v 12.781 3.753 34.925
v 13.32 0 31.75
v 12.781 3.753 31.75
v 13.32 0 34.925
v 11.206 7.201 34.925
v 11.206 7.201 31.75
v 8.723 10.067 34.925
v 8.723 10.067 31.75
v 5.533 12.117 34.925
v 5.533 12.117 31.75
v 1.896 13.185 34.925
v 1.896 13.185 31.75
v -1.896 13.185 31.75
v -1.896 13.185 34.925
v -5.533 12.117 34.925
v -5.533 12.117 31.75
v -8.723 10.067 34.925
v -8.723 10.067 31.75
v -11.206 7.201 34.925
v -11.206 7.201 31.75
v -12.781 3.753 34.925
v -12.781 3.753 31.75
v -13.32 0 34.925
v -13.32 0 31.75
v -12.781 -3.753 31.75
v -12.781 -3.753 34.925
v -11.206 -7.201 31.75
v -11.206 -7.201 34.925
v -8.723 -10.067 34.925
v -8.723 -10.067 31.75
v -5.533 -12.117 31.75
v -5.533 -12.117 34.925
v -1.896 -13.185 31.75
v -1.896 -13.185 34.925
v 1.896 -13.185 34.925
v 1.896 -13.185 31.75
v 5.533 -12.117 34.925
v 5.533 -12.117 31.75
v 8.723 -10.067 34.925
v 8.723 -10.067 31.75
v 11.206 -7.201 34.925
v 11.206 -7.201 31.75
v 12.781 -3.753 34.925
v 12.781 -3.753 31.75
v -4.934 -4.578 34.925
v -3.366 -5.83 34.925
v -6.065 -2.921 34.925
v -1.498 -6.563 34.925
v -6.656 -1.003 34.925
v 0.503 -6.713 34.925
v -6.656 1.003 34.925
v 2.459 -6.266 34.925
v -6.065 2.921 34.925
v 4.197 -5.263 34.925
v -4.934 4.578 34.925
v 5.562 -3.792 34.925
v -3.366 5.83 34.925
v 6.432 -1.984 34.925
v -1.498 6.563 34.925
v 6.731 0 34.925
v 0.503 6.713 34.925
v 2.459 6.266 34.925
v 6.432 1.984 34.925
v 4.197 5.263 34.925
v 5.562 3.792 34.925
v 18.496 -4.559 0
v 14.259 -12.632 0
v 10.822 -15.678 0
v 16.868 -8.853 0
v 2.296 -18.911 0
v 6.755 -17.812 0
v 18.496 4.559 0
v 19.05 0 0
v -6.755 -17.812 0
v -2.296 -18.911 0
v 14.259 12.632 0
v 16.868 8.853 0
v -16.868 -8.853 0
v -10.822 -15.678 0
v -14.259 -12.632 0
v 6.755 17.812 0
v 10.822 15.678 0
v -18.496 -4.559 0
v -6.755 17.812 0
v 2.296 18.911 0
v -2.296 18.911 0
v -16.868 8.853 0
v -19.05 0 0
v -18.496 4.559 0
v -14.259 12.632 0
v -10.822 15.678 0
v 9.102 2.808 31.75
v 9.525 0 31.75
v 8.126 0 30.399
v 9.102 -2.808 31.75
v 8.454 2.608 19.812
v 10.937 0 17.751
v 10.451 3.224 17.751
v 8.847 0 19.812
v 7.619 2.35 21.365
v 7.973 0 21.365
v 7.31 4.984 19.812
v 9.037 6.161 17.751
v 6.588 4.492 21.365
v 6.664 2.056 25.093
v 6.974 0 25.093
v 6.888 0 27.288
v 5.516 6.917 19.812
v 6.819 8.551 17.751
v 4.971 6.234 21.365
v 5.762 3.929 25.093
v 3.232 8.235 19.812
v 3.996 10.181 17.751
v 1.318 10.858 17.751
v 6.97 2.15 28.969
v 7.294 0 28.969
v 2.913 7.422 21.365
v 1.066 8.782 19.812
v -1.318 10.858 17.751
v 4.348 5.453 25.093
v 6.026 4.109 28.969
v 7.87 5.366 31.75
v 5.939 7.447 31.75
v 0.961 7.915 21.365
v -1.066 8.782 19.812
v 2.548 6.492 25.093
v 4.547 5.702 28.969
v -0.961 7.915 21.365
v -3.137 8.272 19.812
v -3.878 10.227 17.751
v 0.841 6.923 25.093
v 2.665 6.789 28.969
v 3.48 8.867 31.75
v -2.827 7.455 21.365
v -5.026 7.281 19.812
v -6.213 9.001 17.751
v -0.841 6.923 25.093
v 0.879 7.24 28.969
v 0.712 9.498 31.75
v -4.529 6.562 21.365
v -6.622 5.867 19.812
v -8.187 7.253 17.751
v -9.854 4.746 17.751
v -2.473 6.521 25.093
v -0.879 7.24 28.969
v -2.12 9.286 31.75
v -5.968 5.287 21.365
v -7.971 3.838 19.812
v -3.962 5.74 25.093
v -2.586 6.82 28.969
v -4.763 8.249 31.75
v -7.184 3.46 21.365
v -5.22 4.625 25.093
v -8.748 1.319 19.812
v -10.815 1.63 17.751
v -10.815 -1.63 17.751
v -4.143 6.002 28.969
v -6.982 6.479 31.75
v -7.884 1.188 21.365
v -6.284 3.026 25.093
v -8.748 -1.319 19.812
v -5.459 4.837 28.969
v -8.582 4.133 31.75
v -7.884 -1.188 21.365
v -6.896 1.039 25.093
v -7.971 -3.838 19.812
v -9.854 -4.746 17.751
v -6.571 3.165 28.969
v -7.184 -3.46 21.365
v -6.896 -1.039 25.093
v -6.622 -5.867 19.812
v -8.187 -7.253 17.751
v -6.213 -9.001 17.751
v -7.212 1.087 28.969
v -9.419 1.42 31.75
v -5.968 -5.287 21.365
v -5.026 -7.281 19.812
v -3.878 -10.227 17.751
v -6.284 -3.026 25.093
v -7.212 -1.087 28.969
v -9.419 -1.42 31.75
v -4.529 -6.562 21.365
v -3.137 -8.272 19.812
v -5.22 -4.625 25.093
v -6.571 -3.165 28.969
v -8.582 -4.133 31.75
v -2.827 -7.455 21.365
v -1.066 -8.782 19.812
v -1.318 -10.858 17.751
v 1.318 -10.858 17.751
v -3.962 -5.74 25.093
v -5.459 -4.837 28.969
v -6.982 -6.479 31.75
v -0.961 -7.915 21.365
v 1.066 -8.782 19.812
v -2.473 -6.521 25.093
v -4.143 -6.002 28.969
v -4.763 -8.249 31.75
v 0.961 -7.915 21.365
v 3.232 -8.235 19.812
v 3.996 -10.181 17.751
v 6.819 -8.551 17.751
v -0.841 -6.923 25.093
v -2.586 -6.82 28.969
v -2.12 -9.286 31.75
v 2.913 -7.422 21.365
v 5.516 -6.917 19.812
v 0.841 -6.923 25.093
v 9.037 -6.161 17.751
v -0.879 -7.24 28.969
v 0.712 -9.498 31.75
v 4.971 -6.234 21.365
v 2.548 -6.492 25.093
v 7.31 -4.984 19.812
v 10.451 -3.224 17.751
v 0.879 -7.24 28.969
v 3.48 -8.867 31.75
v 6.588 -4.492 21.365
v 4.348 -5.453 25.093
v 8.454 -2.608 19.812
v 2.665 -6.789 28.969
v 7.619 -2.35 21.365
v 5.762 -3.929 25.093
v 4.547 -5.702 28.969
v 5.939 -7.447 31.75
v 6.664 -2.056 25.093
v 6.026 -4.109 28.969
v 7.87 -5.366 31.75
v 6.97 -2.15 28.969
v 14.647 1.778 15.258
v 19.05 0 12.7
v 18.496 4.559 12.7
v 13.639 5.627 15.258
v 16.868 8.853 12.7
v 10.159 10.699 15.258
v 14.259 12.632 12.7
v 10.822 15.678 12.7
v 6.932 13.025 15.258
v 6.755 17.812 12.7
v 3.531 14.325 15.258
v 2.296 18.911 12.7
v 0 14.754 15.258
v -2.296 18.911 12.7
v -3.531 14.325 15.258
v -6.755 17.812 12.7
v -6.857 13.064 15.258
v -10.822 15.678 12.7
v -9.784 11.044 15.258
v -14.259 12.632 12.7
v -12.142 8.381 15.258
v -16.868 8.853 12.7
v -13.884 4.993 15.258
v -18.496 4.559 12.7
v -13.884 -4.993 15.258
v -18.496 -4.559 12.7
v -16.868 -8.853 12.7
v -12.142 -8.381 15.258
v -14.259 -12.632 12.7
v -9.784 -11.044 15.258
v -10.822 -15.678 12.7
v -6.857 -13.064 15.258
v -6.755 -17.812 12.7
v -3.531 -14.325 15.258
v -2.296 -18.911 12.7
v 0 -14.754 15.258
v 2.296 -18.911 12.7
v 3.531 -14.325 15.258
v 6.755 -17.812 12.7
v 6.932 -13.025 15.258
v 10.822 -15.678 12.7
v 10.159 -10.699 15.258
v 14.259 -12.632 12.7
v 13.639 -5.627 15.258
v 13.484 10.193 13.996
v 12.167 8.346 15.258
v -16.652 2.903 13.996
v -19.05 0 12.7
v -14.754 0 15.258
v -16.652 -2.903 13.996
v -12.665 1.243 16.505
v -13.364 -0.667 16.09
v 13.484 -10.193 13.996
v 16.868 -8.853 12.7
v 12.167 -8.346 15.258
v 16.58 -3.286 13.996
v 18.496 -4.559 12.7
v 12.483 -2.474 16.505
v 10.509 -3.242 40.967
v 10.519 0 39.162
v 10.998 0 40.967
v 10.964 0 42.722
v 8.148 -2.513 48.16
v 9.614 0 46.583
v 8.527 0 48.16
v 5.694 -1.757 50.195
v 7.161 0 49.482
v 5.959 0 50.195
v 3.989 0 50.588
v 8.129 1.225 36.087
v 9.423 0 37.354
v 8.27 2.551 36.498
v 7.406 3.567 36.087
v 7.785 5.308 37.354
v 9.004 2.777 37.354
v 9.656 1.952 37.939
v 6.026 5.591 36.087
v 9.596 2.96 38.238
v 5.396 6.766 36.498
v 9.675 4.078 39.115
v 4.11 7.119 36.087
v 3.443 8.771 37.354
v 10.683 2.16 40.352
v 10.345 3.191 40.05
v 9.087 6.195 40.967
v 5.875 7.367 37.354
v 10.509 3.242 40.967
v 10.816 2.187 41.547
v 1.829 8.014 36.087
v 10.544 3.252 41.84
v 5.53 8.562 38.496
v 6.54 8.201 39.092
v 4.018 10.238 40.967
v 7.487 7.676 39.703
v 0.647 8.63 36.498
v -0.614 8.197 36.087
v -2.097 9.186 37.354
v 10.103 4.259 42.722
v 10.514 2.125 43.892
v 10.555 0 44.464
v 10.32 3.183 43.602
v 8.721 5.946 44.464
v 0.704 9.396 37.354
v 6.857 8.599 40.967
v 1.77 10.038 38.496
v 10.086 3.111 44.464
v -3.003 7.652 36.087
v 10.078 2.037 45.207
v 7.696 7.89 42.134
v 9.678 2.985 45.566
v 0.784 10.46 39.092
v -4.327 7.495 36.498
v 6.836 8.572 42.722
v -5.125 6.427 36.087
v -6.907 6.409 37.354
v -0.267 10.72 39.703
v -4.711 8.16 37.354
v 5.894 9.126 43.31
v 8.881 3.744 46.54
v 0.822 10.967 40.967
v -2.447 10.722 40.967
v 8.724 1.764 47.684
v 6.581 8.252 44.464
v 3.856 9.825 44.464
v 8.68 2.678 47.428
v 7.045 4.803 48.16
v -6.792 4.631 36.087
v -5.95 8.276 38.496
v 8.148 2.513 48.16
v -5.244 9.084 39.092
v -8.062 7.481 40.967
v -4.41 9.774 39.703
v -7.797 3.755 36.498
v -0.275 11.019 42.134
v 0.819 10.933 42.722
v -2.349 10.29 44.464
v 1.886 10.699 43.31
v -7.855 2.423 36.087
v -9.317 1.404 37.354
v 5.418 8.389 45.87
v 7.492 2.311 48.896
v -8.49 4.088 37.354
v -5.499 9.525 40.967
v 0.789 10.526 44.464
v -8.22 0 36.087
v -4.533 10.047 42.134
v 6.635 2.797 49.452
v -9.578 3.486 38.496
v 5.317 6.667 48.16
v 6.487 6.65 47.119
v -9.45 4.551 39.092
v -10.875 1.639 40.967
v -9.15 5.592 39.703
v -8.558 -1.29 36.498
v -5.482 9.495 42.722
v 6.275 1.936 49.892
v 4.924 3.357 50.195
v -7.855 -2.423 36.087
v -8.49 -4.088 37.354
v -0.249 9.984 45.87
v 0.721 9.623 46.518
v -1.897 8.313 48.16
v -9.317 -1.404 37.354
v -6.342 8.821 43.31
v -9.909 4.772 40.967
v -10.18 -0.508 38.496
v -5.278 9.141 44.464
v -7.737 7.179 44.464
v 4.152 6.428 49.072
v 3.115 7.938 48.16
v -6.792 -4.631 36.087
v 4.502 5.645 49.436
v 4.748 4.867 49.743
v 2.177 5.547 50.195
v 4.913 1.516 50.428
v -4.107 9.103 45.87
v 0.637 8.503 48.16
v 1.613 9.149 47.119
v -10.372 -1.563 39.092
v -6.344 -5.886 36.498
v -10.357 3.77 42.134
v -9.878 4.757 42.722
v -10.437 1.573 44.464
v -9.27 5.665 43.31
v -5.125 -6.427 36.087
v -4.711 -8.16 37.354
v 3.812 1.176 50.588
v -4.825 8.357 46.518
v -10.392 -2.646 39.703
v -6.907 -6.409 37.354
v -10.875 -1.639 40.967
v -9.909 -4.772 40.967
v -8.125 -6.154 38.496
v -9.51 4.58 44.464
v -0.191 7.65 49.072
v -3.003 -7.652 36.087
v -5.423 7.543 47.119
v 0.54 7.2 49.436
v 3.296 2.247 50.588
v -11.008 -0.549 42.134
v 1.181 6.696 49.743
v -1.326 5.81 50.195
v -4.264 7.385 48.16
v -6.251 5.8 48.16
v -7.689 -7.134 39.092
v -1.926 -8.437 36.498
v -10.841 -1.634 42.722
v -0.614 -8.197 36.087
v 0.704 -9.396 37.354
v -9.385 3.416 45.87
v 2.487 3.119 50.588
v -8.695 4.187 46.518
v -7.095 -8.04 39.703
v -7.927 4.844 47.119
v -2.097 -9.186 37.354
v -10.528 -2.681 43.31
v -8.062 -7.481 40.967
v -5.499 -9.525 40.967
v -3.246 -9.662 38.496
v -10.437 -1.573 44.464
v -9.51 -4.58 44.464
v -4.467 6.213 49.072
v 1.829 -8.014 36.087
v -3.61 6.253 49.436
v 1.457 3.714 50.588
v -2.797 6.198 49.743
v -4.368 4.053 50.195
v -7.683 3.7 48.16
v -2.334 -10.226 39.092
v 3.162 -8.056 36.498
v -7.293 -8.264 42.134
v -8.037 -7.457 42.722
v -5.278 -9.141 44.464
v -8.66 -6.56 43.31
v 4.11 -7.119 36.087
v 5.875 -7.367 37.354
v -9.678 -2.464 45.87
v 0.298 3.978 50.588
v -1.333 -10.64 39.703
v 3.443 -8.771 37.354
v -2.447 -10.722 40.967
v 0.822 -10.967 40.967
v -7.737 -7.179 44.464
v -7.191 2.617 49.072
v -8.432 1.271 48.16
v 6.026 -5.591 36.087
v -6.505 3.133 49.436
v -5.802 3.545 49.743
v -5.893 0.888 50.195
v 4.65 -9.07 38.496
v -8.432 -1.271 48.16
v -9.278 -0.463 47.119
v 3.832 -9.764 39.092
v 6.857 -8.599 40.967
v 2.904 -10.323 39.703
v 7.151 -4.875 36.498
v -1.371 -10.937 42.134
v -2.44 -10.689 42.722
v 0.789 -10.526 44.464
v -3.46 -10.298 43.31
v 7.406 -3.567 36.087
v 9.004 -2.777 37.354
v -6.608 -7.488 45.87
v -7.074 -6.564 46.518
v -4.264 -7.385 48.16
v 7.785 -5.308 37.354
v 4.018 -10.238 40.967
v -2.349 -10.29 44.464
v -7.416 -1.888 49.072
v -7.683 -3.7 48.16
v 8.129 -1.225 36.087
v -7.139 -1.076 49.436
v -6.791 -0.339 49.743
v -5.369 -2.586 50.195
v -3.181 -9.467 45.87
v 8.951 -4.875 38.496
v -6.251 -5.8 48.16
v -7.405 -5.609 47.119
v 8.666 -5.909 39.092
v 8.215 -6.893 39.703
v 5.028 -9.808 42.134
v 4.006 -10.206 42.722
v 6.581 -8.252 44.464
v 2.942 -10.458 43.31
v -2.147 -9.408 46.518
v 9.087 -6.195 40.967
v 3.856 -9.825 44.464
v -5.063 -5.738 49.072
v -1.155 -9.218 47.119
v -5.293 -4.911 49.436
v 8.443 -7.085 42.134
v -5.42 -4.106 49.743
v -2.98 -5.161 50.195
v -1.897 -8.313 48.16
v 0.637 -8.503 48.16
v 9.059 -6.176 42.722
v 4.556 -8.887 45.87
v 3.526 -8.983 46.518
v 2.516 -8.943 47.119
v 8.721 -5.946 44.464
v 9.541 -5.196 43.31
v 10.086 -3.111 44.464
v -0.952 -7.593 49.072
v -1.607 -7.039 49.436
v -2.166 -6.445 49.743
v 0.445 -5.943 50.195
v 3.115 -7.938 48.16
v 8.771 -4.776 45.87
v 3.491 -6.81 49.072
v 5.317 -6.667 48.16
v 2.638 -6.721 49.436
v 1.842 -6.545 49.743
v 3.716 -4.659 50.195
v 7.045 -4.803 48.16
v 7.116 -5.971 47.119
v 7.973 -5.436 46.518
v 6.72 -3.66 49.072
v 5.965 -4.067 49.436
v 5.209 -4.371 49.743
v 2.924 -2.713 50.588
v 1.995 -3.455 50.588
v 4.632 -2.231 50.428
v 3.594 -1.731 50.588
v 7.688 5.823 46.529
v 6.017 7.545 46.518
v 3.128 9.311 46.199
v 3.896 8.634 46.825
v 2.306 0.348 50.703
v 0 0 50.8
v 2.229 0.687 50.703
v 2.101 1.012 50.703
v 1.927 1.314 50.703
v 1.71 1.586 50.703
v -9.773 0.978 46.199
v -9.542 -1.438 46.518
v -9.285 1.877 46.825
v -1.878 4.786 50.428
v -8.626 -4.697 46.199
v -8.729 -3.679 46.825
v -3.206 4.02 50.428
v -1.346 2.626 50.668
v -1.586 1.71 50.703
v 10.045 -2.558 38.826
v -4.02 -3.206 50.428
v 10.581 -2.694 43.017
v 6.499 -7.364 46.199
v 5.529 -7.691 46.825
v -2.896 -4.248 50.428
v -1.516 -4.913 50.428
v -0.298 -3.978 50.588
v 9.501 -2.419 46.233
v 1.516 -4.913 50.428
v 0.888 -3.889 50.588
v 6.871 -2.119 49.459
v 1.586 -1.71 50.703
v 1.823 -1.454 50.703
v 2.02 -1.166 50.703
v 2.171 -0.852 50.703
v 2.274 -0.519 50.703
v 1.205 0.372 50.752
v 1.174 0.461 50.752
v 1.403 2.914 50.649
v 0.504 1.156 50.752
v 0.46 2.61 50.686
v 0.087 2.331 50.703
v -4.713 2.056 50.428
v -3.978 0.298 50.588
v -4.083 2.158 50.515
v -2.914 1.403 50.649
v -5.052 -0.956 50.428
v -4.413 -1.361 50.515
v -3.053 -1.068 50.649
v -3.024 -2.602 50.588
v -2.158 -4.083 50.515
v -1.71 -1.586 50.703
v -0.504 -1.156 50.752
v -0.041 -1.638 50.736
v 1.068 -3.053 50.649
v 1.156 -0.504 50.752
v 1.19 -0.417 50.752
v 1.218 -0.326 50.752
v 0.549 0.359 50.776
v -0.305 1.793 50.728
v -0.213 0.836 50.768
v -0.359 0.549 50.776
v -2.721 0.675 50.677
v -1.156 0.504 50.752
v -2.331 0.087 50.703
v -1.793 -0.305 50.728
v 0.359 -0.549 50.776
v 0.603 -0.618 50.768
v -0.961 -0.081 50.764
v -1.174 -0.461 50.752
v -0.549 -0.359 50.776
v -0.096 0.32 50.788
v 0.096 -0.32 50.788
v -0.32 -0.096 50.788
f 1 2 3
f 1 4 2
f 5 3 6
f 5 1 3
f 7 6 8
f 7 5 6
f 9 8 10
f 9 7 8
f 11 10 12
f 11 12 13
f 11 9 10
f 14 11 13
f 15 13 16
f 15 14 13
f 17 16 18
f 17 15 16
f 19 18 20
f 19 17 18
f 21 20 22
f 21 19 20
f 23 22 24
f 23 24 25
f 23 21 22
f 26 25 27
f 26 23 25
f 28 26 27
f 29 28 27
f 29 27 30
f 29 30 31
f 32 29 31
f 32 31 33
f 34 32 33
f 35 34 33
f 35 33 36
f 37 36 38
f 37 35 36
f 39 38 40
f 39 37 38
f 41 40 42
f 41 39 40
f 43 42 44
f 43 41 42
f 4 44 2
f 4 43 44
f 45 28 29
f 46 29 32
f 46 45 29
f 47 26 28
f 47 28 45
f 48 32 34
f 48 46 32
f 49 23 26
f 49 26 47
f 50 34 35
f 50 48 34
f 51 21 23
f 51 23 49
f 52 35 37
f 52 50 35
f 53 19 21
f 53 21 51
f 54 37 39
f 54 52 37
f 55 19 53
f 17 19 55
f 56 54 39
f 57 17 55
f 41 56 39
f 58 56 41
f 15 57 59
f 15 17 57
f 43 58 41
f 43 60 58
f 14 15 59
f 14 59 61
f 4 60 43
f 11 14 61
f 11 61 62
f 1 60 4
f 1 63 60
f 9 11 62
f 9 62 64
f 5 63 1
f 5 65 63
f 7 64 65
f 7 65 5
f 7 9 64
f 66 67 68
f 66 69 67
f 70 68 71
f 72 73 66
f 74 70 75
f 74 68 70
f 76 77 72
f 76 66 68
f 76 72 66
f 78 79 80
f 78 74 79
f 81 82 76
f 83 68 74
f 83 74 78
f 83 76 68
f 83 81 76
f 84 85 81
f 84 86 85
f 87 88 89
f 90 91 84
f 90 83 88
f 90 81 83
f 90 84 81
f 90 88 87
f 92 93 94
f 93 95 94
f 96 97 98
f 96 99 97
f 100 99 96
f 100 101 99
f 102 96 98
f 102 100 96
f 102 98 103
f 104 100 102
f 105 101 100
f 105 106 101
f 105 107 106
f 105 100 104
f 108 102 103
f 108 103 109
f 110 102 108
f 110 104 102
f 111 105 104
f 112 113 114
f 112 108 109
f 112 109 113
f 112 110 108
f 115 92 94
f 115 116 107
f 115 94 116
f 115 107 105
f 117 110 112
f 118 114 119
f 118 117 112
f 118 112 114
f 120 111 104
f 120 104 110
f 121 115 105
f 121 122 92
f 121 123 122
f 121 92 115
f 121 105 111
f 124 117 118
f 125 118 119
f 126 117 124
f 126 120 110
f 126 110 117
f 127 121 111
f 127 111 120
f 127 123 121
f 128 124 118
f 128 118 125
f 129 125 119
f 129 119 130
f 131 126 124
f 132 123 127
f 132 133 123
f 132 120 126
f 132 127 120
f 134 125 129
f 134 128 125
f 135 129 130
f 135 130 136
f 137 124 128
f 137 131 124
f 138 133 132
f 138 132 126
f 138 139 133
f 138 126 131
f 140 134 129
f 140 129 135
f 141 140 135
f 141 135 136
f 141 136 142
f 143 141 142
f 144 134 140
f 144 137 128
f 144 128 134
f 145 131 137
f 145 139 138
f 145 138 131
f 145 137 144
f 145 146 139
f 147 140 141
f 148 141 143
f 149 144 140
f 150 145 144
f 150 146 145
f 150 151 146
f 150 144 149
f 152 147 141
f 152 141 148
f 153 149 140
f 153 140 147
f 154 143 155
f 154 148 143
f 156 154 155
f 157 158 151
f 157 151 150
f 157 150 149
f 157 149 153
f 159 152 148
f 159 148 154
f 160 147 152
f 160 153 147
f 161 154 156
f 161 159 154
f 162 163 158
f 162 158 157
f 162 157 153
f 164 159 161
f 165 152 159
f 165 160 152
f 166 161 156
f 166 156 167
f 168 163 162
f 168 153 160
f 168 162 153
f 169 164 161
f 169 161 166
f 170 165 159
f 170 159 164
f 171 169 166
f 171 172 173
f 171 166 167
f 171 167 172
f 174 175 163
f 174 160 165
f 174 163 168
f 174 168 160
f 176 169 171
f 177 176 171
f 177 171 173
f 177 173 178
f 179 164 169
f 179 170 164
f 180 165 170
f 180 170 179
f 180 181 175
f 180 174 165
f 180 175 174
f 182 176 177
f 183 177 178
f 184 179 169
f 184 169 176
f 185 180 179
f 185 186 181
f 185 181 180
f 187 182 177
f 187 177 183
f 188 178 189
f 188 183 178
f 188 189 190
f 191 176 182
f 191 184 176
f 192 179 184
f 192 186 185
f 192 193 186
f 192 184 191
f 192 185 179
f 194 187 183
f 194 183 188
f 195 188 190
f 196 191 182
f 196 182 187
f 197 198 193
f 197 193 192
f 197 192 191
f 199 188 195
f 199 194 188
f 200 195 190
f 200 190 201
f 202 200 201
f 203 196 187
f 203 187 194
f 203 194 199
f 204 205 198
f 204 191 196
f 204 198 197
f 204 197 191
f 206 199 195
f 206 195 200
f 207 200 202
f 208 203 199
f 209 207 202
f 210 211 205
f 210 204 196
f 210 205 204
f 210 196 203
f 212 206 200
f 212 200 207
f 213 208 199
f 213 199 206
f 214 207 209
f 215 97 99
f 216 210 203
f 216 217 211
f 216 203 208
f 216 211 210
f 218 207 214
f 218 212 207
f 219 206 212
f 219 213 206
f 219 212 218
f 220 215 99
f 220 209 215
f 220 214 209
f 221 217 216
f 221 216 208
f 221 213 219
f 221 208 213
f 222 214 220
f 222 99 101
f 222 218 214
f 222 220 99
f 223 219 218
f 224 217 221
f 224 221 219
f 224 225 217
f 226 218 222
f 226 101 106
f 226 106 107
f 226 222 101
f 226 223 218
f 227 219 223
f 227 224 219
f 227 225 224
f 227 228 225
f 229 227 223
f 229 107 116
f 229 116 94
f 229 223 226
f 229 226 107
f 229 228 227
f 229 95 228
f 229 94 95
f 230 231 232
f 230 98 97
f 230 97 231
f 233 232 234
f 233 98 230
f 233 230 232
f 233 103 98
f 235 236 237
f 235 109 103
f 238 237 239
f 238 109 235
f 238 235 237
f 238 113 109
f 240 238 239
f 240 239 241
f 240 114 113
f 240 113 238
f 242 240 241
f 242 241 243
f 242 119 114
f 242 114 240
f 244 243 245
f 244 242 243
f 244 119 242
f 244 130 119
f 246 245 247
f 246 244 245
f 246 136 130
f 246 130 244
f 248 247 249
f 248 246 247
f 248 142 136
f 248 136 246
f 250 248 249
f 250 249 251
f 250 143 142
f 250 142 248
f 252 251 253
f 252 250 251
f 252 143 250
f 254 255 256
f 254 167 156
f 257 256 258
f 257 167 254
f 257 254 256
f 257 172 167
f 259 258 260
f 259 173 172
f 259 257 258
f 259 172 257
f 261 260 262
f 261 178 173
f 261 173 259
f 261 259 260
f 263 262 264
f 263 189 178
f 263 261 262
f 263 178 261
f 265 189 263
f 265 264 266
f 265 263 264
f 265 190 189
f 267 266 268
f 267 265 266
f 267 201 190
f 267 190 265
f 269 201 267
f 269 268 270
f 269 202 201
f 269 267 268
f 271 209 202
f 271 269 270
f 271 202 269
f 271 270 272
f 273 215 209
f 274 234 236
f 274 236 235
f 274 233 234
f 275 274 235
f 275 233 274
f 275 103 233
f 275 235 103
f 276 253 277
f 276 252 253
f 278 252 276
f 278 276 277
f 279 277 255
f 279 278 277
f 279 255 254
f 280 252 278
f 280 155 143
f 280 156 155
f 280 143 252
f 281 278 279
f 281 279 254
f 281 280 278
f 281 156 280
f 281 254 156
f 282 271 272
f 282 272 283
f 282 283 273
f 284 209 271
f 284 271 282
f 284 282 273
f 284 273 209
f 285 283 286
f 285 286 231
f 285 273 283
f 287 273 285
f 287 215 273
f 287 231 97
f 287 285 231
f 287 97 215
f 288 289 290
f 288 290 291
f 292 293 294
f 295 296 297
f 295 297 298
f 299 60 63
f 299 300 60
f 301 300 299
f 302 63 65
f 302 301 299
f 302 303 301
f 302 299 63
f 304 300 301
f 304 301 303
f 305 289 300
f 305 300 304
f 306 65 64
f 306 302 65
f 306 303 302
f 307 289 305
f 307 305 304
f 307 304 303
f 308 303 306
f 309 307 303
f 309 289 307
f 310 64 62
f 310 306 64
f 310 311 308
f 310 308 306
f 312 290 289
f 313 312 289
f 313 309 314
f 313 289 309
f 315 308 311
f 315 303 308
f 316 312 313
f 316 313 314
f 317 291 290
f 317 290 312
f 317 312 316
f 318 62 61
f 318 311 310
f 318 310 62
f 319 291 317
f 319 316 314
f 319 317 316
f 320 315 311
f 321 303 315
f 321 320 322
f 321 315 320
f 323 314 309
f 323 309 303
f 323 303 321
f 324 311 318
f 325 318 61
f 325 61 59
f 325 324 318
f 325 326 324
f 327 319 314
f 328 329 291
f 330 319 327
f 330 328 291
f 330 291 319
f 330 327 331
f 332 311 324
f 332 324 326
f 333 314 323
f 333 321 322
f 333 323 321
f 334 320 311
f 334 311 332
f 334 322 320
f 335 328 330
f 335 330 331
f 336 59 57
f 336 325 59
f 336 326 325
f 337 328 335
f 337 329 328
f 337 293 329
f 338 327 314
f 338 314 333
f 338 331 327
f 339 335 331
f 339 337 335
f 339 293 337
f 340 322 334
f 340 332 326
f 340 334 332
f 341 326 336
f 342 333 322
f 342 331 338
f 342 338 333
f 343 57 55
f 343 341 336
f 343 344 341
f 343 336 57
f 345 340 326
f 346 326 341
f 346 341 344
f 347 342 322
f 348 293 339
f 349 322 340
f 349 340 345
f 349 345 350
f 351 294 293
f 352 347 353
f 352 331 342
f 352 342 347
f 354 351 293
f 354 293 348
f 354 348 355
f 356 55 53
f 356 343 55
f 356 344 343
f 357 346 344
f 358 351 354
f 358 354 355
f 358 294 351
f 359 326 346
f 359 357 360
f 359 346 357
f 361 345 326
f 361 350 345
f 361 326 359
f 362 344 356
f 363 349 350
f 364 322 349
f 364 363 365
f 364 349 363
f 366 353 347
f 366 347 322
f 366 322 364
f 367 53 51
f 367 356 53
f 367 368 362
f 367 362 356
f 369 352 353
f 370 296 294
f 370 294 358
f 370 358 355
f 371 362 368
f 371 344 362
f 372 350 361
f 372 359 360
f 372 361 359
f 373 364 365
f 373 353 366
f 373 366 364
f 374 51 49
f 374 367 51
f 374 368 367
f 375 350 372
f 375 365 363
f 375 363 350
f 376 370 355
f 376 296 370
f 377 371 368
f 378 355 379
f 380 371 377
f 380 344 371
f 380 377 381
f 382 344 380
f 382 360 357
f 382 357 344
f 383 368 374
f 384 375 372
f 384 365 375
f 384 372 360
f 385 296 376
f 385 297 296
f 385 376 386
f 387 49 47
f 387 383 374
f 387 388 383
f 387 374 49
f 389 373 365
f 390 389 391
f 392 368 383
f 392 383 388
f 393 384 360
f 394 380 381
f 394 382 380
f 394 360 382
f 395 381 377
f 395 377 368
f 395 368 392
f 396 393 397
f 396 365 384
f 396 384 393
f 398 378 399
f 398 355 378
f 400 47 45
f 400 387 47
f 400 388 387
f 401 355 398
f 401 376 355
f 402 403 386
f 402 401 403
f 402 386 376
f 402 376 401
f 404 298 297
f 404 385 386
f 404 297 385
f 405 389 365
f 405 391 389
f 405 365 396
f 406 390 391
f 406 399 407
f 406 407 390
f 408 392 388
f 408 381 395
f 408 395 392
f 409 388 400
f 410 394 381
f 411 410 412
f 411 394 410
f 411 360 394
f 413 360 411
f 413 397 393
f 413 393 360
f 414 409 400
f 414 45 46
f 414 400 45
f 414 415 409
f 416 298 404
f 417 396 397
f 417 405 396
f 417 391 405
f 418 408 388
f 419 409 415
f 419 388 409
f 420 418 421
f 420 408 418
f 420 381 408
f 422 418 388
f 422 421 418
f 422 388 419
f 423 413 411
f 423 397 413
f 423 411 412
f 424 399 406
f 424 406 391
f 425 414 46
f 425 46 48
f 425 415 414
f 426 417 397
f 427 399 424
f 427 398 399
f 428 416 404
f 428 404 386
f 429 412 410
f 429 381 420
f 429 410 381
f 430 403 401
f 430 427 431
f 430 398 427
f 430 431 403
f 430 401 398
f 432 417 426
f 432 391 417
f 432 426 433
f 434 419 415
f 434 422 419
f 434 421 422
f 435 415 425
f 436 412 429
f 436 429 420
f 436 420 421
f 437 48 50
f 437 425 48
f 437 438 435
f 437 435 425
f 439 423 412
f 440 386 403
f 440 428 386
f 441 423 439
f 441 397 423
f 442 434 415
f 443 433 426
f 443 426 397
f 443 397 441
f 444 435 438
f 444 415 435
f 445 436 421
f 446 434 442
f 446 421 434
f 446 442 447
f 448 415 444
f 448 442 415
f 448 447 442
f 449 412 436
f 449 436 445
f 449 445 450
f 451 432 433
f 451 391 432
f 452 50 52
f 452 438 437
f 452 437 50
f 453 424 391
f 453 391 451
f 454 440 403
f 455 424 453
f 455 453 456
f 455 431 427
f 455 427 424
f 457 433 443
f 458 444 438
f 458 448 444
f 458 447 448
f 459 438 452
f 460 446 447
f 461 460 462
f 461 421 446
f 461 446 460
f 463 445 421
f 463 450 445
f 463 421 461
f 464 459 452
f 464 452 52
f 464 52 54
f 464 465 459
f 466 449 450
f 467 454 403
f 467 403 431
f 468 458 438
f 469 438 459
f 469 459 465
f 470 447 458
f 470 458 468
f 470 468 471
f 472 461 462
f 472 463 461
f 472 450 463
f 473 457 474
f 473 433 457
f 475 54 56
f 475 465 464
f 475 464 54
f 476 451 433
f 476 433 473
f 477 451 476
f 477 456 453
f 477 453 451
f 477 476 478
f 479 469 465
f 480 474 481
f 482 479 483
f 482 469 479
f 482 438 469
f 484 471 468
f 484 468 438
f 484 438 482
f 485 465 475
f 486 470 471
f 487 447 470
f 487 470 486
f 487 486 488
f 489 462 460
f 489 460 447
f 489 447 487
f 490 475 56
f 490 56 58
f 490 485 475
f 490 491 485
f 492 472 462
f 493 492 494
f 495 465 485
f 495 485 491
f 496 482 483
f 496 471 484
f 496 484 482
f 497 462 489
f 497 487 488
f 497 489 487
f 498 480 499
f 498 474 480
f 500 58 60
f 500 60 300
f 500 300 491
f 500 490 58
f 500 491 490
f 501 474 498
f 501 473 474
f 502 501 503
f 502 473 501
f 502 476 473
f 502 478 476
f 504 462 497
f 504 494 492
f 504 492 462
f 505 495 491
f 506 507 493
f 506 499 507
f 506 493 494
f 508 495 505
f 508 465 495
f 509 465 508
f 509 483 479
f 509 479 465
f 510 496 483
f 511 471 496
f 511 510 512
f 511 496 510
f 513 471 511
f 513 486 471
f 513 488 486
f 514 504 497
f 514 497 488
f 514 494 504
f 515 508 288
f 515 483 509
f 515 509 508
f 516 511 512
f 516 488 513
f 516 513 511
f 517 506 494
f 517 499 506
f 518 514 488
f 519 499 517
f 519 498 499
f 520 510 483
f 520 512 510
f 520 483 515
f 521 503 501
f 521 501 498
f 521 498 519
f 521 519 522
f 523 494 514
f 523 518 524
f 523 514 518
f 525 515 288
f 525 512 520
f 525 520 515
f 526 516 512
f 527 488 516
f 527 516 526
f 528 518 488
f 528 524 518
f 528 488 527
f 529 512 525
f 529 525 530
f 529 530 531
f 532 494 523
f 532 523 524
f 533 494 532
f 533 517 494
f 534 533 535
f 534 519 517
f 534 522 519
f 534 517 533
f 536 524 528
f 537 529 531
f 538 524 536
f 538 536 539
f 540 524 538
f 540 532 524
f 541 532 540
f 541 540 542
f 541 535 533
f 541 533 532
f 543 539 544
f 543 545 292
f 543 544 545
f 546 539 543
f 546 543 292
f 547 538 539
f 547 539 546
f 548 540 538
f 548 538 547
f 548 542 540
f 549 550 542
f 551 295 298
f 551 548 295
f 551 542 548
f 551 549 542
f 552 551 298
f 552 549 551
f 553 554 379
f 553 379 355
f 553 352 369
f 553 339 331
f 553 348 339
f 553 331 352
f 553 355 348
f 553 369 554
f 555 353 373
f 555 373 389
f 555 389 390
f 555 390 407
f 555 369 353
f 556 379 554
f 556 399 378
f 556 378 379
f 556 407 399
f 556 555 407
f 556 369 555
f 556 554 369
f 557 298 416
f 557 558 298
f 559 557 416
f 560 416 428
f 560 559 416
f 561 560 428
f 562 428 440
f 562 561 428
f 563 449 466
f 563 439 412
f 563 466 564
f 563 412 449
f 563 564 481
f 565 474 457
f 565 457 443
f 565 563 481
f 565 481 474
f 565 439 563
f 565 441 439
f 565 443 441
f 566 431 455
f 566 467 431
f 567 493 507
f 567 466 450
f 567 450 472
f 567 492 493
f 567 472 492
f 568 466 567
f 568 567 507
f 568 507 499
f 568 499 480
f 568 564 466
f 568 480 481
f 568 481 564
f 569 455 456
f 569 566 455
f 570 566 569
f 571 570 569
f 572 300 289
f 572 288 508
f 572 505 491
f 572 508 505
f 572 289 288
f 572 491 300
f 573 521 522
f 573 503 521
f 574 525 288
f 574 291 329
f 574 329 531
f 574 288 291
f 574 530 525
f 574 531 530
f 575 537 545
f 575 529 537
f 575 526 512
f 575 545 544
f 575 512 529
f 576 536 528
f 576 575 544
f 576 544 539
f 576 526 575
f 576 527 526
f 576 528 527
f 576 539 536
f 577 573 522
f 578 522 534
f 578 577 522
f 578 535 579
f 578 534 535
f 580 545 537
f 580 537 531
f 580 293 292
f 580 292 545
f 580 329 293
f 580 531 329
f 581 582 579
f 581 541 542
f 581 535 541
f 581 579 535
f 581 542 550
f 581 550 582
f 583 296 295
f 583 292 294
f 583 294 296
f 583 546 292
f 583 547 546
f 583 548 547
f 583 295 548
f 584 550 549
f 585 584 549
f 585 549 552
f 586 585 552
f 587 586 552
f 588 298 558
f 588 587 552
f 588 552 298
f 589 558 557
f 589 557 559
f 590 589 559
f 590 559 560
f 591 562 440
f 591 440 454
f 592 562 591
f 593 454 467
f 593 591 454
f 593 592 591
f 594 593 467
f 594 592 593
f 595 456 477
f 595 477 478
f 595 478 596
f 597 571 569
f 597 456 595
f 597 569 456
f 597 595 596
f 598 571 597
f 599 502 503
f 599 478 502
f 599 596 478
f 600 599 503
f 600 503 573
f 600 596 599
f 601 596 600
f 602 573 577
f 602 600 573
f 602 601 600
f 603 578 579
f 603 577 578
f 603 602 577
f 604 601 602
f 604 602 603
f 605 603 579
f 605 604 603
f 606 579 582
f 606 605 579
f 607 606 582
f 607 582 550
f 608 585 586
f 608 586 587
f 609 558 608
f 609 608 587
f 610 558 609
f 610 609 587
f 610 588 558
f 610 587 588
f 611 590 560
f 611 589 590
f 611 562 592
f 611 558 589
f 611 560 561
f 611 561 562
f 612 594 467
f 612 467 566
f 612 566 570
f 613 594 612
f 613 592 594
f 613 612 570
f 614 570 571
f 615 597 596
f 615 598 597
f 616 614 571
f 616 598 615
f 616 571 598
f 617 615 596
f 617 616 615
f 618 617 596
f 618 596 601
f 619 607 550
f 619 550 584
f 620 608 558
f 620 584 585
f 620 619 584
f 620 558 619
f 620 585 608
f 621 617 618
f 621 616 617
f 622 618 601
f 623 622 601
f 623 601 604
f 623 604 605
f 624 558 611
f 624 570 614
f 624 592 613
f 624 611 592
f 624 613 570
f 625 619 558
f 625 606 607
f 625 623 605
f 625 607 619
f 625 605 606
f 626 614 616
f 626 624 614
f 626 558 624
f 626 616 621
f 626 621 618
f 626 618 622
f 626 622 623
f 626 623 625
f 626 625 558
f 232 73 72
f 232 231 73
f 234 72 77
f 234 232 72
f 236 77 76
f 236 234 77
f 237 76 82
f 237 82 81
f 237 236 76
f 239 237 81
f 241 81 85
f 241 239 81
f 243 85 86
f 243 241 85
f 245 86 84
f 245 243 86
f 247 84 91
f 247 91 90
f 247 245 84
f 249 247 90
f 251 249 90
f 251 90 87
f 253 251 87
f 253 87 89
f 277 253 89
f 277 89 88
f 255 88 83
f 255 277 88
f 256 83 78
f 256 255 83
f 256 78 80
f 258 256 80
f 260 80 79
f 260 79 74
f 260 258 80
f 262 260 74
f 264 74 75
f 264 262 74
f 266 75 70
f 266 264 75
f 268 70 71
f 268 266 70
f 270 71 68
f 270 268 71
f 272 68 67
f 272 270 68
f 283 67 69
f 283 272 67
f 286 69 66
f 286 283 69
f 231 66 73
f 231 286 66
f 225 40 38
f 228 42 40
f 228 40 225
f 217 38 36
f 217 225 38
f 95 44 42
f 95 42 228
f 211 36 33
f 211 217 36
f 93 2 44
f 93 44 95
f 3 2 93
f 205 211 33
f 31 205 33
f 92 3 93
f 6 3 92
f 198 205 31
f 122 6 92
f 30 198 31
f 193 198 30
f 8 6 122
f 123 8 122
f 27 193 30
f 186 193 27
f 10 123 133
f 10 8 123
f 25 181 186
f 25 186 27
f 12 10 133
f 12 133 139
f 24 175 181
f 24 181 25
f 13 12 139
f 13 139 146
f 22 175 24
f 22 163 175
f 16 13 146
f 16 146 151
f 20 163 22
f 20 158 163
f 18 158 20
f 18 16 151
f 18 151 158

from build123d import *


with BuildPart() as f1:
    # F0 (on Front) → F1 (revolve)
    with BuildSketch(Plane.XZ):
        with BuildLine():
            Line((0, 50.8), (0, 34.925))
            Line((0, 34.925), (6.7313371377, 34.925))
            add(Edge.make_bspline(
                [(6.7313371377, 34.925), (9.1660192998, 36.584243404), (12.1811256362, 40.5329028803), (9.7038379806, 47.230680767), (6.3139233711, 50.4087846074), (4.754697213, 50.6305893646), (0, 50.8)],
                knots=[0, 0, 0, 0, 0.277452726, 0.5363338254, 0.7326009529, 1, 1, 1, 1], degree=3))
        make_face()
        Polygon((0, 34.925), (0, 31.75), (9.525, 31.75), (13.320277445, 31.75), (13.320277445, 34.925), (6.7313371377, 34.925), align=None)
        with BuildLine():
            Line((0, 31.75), (0, 0))
            Line((0, 0), (19.05, 0))
            Line((19.05, 0), (19.05, 12.7))
            add(Edge.make_bspline(
                [(19.05, 12.7), (15.6445959161, 14.8300528587), (9.037378424, 18.1241412945), (7.0251417677, 23.6118438651), (6.2528101904, 29.2835176444), (9.525, 31.75)],
                knots=[0, 0, 0, 0, 0.3900175878, 0.6631477467, 1, 1, 1, 1], degree=3))
            Line((9.525, 31.75), (0, 31.75))
        make_face()
    revolve(axis=Axis((0, 0, 25.4), (0, 0, 1)))


solid = f1.part
